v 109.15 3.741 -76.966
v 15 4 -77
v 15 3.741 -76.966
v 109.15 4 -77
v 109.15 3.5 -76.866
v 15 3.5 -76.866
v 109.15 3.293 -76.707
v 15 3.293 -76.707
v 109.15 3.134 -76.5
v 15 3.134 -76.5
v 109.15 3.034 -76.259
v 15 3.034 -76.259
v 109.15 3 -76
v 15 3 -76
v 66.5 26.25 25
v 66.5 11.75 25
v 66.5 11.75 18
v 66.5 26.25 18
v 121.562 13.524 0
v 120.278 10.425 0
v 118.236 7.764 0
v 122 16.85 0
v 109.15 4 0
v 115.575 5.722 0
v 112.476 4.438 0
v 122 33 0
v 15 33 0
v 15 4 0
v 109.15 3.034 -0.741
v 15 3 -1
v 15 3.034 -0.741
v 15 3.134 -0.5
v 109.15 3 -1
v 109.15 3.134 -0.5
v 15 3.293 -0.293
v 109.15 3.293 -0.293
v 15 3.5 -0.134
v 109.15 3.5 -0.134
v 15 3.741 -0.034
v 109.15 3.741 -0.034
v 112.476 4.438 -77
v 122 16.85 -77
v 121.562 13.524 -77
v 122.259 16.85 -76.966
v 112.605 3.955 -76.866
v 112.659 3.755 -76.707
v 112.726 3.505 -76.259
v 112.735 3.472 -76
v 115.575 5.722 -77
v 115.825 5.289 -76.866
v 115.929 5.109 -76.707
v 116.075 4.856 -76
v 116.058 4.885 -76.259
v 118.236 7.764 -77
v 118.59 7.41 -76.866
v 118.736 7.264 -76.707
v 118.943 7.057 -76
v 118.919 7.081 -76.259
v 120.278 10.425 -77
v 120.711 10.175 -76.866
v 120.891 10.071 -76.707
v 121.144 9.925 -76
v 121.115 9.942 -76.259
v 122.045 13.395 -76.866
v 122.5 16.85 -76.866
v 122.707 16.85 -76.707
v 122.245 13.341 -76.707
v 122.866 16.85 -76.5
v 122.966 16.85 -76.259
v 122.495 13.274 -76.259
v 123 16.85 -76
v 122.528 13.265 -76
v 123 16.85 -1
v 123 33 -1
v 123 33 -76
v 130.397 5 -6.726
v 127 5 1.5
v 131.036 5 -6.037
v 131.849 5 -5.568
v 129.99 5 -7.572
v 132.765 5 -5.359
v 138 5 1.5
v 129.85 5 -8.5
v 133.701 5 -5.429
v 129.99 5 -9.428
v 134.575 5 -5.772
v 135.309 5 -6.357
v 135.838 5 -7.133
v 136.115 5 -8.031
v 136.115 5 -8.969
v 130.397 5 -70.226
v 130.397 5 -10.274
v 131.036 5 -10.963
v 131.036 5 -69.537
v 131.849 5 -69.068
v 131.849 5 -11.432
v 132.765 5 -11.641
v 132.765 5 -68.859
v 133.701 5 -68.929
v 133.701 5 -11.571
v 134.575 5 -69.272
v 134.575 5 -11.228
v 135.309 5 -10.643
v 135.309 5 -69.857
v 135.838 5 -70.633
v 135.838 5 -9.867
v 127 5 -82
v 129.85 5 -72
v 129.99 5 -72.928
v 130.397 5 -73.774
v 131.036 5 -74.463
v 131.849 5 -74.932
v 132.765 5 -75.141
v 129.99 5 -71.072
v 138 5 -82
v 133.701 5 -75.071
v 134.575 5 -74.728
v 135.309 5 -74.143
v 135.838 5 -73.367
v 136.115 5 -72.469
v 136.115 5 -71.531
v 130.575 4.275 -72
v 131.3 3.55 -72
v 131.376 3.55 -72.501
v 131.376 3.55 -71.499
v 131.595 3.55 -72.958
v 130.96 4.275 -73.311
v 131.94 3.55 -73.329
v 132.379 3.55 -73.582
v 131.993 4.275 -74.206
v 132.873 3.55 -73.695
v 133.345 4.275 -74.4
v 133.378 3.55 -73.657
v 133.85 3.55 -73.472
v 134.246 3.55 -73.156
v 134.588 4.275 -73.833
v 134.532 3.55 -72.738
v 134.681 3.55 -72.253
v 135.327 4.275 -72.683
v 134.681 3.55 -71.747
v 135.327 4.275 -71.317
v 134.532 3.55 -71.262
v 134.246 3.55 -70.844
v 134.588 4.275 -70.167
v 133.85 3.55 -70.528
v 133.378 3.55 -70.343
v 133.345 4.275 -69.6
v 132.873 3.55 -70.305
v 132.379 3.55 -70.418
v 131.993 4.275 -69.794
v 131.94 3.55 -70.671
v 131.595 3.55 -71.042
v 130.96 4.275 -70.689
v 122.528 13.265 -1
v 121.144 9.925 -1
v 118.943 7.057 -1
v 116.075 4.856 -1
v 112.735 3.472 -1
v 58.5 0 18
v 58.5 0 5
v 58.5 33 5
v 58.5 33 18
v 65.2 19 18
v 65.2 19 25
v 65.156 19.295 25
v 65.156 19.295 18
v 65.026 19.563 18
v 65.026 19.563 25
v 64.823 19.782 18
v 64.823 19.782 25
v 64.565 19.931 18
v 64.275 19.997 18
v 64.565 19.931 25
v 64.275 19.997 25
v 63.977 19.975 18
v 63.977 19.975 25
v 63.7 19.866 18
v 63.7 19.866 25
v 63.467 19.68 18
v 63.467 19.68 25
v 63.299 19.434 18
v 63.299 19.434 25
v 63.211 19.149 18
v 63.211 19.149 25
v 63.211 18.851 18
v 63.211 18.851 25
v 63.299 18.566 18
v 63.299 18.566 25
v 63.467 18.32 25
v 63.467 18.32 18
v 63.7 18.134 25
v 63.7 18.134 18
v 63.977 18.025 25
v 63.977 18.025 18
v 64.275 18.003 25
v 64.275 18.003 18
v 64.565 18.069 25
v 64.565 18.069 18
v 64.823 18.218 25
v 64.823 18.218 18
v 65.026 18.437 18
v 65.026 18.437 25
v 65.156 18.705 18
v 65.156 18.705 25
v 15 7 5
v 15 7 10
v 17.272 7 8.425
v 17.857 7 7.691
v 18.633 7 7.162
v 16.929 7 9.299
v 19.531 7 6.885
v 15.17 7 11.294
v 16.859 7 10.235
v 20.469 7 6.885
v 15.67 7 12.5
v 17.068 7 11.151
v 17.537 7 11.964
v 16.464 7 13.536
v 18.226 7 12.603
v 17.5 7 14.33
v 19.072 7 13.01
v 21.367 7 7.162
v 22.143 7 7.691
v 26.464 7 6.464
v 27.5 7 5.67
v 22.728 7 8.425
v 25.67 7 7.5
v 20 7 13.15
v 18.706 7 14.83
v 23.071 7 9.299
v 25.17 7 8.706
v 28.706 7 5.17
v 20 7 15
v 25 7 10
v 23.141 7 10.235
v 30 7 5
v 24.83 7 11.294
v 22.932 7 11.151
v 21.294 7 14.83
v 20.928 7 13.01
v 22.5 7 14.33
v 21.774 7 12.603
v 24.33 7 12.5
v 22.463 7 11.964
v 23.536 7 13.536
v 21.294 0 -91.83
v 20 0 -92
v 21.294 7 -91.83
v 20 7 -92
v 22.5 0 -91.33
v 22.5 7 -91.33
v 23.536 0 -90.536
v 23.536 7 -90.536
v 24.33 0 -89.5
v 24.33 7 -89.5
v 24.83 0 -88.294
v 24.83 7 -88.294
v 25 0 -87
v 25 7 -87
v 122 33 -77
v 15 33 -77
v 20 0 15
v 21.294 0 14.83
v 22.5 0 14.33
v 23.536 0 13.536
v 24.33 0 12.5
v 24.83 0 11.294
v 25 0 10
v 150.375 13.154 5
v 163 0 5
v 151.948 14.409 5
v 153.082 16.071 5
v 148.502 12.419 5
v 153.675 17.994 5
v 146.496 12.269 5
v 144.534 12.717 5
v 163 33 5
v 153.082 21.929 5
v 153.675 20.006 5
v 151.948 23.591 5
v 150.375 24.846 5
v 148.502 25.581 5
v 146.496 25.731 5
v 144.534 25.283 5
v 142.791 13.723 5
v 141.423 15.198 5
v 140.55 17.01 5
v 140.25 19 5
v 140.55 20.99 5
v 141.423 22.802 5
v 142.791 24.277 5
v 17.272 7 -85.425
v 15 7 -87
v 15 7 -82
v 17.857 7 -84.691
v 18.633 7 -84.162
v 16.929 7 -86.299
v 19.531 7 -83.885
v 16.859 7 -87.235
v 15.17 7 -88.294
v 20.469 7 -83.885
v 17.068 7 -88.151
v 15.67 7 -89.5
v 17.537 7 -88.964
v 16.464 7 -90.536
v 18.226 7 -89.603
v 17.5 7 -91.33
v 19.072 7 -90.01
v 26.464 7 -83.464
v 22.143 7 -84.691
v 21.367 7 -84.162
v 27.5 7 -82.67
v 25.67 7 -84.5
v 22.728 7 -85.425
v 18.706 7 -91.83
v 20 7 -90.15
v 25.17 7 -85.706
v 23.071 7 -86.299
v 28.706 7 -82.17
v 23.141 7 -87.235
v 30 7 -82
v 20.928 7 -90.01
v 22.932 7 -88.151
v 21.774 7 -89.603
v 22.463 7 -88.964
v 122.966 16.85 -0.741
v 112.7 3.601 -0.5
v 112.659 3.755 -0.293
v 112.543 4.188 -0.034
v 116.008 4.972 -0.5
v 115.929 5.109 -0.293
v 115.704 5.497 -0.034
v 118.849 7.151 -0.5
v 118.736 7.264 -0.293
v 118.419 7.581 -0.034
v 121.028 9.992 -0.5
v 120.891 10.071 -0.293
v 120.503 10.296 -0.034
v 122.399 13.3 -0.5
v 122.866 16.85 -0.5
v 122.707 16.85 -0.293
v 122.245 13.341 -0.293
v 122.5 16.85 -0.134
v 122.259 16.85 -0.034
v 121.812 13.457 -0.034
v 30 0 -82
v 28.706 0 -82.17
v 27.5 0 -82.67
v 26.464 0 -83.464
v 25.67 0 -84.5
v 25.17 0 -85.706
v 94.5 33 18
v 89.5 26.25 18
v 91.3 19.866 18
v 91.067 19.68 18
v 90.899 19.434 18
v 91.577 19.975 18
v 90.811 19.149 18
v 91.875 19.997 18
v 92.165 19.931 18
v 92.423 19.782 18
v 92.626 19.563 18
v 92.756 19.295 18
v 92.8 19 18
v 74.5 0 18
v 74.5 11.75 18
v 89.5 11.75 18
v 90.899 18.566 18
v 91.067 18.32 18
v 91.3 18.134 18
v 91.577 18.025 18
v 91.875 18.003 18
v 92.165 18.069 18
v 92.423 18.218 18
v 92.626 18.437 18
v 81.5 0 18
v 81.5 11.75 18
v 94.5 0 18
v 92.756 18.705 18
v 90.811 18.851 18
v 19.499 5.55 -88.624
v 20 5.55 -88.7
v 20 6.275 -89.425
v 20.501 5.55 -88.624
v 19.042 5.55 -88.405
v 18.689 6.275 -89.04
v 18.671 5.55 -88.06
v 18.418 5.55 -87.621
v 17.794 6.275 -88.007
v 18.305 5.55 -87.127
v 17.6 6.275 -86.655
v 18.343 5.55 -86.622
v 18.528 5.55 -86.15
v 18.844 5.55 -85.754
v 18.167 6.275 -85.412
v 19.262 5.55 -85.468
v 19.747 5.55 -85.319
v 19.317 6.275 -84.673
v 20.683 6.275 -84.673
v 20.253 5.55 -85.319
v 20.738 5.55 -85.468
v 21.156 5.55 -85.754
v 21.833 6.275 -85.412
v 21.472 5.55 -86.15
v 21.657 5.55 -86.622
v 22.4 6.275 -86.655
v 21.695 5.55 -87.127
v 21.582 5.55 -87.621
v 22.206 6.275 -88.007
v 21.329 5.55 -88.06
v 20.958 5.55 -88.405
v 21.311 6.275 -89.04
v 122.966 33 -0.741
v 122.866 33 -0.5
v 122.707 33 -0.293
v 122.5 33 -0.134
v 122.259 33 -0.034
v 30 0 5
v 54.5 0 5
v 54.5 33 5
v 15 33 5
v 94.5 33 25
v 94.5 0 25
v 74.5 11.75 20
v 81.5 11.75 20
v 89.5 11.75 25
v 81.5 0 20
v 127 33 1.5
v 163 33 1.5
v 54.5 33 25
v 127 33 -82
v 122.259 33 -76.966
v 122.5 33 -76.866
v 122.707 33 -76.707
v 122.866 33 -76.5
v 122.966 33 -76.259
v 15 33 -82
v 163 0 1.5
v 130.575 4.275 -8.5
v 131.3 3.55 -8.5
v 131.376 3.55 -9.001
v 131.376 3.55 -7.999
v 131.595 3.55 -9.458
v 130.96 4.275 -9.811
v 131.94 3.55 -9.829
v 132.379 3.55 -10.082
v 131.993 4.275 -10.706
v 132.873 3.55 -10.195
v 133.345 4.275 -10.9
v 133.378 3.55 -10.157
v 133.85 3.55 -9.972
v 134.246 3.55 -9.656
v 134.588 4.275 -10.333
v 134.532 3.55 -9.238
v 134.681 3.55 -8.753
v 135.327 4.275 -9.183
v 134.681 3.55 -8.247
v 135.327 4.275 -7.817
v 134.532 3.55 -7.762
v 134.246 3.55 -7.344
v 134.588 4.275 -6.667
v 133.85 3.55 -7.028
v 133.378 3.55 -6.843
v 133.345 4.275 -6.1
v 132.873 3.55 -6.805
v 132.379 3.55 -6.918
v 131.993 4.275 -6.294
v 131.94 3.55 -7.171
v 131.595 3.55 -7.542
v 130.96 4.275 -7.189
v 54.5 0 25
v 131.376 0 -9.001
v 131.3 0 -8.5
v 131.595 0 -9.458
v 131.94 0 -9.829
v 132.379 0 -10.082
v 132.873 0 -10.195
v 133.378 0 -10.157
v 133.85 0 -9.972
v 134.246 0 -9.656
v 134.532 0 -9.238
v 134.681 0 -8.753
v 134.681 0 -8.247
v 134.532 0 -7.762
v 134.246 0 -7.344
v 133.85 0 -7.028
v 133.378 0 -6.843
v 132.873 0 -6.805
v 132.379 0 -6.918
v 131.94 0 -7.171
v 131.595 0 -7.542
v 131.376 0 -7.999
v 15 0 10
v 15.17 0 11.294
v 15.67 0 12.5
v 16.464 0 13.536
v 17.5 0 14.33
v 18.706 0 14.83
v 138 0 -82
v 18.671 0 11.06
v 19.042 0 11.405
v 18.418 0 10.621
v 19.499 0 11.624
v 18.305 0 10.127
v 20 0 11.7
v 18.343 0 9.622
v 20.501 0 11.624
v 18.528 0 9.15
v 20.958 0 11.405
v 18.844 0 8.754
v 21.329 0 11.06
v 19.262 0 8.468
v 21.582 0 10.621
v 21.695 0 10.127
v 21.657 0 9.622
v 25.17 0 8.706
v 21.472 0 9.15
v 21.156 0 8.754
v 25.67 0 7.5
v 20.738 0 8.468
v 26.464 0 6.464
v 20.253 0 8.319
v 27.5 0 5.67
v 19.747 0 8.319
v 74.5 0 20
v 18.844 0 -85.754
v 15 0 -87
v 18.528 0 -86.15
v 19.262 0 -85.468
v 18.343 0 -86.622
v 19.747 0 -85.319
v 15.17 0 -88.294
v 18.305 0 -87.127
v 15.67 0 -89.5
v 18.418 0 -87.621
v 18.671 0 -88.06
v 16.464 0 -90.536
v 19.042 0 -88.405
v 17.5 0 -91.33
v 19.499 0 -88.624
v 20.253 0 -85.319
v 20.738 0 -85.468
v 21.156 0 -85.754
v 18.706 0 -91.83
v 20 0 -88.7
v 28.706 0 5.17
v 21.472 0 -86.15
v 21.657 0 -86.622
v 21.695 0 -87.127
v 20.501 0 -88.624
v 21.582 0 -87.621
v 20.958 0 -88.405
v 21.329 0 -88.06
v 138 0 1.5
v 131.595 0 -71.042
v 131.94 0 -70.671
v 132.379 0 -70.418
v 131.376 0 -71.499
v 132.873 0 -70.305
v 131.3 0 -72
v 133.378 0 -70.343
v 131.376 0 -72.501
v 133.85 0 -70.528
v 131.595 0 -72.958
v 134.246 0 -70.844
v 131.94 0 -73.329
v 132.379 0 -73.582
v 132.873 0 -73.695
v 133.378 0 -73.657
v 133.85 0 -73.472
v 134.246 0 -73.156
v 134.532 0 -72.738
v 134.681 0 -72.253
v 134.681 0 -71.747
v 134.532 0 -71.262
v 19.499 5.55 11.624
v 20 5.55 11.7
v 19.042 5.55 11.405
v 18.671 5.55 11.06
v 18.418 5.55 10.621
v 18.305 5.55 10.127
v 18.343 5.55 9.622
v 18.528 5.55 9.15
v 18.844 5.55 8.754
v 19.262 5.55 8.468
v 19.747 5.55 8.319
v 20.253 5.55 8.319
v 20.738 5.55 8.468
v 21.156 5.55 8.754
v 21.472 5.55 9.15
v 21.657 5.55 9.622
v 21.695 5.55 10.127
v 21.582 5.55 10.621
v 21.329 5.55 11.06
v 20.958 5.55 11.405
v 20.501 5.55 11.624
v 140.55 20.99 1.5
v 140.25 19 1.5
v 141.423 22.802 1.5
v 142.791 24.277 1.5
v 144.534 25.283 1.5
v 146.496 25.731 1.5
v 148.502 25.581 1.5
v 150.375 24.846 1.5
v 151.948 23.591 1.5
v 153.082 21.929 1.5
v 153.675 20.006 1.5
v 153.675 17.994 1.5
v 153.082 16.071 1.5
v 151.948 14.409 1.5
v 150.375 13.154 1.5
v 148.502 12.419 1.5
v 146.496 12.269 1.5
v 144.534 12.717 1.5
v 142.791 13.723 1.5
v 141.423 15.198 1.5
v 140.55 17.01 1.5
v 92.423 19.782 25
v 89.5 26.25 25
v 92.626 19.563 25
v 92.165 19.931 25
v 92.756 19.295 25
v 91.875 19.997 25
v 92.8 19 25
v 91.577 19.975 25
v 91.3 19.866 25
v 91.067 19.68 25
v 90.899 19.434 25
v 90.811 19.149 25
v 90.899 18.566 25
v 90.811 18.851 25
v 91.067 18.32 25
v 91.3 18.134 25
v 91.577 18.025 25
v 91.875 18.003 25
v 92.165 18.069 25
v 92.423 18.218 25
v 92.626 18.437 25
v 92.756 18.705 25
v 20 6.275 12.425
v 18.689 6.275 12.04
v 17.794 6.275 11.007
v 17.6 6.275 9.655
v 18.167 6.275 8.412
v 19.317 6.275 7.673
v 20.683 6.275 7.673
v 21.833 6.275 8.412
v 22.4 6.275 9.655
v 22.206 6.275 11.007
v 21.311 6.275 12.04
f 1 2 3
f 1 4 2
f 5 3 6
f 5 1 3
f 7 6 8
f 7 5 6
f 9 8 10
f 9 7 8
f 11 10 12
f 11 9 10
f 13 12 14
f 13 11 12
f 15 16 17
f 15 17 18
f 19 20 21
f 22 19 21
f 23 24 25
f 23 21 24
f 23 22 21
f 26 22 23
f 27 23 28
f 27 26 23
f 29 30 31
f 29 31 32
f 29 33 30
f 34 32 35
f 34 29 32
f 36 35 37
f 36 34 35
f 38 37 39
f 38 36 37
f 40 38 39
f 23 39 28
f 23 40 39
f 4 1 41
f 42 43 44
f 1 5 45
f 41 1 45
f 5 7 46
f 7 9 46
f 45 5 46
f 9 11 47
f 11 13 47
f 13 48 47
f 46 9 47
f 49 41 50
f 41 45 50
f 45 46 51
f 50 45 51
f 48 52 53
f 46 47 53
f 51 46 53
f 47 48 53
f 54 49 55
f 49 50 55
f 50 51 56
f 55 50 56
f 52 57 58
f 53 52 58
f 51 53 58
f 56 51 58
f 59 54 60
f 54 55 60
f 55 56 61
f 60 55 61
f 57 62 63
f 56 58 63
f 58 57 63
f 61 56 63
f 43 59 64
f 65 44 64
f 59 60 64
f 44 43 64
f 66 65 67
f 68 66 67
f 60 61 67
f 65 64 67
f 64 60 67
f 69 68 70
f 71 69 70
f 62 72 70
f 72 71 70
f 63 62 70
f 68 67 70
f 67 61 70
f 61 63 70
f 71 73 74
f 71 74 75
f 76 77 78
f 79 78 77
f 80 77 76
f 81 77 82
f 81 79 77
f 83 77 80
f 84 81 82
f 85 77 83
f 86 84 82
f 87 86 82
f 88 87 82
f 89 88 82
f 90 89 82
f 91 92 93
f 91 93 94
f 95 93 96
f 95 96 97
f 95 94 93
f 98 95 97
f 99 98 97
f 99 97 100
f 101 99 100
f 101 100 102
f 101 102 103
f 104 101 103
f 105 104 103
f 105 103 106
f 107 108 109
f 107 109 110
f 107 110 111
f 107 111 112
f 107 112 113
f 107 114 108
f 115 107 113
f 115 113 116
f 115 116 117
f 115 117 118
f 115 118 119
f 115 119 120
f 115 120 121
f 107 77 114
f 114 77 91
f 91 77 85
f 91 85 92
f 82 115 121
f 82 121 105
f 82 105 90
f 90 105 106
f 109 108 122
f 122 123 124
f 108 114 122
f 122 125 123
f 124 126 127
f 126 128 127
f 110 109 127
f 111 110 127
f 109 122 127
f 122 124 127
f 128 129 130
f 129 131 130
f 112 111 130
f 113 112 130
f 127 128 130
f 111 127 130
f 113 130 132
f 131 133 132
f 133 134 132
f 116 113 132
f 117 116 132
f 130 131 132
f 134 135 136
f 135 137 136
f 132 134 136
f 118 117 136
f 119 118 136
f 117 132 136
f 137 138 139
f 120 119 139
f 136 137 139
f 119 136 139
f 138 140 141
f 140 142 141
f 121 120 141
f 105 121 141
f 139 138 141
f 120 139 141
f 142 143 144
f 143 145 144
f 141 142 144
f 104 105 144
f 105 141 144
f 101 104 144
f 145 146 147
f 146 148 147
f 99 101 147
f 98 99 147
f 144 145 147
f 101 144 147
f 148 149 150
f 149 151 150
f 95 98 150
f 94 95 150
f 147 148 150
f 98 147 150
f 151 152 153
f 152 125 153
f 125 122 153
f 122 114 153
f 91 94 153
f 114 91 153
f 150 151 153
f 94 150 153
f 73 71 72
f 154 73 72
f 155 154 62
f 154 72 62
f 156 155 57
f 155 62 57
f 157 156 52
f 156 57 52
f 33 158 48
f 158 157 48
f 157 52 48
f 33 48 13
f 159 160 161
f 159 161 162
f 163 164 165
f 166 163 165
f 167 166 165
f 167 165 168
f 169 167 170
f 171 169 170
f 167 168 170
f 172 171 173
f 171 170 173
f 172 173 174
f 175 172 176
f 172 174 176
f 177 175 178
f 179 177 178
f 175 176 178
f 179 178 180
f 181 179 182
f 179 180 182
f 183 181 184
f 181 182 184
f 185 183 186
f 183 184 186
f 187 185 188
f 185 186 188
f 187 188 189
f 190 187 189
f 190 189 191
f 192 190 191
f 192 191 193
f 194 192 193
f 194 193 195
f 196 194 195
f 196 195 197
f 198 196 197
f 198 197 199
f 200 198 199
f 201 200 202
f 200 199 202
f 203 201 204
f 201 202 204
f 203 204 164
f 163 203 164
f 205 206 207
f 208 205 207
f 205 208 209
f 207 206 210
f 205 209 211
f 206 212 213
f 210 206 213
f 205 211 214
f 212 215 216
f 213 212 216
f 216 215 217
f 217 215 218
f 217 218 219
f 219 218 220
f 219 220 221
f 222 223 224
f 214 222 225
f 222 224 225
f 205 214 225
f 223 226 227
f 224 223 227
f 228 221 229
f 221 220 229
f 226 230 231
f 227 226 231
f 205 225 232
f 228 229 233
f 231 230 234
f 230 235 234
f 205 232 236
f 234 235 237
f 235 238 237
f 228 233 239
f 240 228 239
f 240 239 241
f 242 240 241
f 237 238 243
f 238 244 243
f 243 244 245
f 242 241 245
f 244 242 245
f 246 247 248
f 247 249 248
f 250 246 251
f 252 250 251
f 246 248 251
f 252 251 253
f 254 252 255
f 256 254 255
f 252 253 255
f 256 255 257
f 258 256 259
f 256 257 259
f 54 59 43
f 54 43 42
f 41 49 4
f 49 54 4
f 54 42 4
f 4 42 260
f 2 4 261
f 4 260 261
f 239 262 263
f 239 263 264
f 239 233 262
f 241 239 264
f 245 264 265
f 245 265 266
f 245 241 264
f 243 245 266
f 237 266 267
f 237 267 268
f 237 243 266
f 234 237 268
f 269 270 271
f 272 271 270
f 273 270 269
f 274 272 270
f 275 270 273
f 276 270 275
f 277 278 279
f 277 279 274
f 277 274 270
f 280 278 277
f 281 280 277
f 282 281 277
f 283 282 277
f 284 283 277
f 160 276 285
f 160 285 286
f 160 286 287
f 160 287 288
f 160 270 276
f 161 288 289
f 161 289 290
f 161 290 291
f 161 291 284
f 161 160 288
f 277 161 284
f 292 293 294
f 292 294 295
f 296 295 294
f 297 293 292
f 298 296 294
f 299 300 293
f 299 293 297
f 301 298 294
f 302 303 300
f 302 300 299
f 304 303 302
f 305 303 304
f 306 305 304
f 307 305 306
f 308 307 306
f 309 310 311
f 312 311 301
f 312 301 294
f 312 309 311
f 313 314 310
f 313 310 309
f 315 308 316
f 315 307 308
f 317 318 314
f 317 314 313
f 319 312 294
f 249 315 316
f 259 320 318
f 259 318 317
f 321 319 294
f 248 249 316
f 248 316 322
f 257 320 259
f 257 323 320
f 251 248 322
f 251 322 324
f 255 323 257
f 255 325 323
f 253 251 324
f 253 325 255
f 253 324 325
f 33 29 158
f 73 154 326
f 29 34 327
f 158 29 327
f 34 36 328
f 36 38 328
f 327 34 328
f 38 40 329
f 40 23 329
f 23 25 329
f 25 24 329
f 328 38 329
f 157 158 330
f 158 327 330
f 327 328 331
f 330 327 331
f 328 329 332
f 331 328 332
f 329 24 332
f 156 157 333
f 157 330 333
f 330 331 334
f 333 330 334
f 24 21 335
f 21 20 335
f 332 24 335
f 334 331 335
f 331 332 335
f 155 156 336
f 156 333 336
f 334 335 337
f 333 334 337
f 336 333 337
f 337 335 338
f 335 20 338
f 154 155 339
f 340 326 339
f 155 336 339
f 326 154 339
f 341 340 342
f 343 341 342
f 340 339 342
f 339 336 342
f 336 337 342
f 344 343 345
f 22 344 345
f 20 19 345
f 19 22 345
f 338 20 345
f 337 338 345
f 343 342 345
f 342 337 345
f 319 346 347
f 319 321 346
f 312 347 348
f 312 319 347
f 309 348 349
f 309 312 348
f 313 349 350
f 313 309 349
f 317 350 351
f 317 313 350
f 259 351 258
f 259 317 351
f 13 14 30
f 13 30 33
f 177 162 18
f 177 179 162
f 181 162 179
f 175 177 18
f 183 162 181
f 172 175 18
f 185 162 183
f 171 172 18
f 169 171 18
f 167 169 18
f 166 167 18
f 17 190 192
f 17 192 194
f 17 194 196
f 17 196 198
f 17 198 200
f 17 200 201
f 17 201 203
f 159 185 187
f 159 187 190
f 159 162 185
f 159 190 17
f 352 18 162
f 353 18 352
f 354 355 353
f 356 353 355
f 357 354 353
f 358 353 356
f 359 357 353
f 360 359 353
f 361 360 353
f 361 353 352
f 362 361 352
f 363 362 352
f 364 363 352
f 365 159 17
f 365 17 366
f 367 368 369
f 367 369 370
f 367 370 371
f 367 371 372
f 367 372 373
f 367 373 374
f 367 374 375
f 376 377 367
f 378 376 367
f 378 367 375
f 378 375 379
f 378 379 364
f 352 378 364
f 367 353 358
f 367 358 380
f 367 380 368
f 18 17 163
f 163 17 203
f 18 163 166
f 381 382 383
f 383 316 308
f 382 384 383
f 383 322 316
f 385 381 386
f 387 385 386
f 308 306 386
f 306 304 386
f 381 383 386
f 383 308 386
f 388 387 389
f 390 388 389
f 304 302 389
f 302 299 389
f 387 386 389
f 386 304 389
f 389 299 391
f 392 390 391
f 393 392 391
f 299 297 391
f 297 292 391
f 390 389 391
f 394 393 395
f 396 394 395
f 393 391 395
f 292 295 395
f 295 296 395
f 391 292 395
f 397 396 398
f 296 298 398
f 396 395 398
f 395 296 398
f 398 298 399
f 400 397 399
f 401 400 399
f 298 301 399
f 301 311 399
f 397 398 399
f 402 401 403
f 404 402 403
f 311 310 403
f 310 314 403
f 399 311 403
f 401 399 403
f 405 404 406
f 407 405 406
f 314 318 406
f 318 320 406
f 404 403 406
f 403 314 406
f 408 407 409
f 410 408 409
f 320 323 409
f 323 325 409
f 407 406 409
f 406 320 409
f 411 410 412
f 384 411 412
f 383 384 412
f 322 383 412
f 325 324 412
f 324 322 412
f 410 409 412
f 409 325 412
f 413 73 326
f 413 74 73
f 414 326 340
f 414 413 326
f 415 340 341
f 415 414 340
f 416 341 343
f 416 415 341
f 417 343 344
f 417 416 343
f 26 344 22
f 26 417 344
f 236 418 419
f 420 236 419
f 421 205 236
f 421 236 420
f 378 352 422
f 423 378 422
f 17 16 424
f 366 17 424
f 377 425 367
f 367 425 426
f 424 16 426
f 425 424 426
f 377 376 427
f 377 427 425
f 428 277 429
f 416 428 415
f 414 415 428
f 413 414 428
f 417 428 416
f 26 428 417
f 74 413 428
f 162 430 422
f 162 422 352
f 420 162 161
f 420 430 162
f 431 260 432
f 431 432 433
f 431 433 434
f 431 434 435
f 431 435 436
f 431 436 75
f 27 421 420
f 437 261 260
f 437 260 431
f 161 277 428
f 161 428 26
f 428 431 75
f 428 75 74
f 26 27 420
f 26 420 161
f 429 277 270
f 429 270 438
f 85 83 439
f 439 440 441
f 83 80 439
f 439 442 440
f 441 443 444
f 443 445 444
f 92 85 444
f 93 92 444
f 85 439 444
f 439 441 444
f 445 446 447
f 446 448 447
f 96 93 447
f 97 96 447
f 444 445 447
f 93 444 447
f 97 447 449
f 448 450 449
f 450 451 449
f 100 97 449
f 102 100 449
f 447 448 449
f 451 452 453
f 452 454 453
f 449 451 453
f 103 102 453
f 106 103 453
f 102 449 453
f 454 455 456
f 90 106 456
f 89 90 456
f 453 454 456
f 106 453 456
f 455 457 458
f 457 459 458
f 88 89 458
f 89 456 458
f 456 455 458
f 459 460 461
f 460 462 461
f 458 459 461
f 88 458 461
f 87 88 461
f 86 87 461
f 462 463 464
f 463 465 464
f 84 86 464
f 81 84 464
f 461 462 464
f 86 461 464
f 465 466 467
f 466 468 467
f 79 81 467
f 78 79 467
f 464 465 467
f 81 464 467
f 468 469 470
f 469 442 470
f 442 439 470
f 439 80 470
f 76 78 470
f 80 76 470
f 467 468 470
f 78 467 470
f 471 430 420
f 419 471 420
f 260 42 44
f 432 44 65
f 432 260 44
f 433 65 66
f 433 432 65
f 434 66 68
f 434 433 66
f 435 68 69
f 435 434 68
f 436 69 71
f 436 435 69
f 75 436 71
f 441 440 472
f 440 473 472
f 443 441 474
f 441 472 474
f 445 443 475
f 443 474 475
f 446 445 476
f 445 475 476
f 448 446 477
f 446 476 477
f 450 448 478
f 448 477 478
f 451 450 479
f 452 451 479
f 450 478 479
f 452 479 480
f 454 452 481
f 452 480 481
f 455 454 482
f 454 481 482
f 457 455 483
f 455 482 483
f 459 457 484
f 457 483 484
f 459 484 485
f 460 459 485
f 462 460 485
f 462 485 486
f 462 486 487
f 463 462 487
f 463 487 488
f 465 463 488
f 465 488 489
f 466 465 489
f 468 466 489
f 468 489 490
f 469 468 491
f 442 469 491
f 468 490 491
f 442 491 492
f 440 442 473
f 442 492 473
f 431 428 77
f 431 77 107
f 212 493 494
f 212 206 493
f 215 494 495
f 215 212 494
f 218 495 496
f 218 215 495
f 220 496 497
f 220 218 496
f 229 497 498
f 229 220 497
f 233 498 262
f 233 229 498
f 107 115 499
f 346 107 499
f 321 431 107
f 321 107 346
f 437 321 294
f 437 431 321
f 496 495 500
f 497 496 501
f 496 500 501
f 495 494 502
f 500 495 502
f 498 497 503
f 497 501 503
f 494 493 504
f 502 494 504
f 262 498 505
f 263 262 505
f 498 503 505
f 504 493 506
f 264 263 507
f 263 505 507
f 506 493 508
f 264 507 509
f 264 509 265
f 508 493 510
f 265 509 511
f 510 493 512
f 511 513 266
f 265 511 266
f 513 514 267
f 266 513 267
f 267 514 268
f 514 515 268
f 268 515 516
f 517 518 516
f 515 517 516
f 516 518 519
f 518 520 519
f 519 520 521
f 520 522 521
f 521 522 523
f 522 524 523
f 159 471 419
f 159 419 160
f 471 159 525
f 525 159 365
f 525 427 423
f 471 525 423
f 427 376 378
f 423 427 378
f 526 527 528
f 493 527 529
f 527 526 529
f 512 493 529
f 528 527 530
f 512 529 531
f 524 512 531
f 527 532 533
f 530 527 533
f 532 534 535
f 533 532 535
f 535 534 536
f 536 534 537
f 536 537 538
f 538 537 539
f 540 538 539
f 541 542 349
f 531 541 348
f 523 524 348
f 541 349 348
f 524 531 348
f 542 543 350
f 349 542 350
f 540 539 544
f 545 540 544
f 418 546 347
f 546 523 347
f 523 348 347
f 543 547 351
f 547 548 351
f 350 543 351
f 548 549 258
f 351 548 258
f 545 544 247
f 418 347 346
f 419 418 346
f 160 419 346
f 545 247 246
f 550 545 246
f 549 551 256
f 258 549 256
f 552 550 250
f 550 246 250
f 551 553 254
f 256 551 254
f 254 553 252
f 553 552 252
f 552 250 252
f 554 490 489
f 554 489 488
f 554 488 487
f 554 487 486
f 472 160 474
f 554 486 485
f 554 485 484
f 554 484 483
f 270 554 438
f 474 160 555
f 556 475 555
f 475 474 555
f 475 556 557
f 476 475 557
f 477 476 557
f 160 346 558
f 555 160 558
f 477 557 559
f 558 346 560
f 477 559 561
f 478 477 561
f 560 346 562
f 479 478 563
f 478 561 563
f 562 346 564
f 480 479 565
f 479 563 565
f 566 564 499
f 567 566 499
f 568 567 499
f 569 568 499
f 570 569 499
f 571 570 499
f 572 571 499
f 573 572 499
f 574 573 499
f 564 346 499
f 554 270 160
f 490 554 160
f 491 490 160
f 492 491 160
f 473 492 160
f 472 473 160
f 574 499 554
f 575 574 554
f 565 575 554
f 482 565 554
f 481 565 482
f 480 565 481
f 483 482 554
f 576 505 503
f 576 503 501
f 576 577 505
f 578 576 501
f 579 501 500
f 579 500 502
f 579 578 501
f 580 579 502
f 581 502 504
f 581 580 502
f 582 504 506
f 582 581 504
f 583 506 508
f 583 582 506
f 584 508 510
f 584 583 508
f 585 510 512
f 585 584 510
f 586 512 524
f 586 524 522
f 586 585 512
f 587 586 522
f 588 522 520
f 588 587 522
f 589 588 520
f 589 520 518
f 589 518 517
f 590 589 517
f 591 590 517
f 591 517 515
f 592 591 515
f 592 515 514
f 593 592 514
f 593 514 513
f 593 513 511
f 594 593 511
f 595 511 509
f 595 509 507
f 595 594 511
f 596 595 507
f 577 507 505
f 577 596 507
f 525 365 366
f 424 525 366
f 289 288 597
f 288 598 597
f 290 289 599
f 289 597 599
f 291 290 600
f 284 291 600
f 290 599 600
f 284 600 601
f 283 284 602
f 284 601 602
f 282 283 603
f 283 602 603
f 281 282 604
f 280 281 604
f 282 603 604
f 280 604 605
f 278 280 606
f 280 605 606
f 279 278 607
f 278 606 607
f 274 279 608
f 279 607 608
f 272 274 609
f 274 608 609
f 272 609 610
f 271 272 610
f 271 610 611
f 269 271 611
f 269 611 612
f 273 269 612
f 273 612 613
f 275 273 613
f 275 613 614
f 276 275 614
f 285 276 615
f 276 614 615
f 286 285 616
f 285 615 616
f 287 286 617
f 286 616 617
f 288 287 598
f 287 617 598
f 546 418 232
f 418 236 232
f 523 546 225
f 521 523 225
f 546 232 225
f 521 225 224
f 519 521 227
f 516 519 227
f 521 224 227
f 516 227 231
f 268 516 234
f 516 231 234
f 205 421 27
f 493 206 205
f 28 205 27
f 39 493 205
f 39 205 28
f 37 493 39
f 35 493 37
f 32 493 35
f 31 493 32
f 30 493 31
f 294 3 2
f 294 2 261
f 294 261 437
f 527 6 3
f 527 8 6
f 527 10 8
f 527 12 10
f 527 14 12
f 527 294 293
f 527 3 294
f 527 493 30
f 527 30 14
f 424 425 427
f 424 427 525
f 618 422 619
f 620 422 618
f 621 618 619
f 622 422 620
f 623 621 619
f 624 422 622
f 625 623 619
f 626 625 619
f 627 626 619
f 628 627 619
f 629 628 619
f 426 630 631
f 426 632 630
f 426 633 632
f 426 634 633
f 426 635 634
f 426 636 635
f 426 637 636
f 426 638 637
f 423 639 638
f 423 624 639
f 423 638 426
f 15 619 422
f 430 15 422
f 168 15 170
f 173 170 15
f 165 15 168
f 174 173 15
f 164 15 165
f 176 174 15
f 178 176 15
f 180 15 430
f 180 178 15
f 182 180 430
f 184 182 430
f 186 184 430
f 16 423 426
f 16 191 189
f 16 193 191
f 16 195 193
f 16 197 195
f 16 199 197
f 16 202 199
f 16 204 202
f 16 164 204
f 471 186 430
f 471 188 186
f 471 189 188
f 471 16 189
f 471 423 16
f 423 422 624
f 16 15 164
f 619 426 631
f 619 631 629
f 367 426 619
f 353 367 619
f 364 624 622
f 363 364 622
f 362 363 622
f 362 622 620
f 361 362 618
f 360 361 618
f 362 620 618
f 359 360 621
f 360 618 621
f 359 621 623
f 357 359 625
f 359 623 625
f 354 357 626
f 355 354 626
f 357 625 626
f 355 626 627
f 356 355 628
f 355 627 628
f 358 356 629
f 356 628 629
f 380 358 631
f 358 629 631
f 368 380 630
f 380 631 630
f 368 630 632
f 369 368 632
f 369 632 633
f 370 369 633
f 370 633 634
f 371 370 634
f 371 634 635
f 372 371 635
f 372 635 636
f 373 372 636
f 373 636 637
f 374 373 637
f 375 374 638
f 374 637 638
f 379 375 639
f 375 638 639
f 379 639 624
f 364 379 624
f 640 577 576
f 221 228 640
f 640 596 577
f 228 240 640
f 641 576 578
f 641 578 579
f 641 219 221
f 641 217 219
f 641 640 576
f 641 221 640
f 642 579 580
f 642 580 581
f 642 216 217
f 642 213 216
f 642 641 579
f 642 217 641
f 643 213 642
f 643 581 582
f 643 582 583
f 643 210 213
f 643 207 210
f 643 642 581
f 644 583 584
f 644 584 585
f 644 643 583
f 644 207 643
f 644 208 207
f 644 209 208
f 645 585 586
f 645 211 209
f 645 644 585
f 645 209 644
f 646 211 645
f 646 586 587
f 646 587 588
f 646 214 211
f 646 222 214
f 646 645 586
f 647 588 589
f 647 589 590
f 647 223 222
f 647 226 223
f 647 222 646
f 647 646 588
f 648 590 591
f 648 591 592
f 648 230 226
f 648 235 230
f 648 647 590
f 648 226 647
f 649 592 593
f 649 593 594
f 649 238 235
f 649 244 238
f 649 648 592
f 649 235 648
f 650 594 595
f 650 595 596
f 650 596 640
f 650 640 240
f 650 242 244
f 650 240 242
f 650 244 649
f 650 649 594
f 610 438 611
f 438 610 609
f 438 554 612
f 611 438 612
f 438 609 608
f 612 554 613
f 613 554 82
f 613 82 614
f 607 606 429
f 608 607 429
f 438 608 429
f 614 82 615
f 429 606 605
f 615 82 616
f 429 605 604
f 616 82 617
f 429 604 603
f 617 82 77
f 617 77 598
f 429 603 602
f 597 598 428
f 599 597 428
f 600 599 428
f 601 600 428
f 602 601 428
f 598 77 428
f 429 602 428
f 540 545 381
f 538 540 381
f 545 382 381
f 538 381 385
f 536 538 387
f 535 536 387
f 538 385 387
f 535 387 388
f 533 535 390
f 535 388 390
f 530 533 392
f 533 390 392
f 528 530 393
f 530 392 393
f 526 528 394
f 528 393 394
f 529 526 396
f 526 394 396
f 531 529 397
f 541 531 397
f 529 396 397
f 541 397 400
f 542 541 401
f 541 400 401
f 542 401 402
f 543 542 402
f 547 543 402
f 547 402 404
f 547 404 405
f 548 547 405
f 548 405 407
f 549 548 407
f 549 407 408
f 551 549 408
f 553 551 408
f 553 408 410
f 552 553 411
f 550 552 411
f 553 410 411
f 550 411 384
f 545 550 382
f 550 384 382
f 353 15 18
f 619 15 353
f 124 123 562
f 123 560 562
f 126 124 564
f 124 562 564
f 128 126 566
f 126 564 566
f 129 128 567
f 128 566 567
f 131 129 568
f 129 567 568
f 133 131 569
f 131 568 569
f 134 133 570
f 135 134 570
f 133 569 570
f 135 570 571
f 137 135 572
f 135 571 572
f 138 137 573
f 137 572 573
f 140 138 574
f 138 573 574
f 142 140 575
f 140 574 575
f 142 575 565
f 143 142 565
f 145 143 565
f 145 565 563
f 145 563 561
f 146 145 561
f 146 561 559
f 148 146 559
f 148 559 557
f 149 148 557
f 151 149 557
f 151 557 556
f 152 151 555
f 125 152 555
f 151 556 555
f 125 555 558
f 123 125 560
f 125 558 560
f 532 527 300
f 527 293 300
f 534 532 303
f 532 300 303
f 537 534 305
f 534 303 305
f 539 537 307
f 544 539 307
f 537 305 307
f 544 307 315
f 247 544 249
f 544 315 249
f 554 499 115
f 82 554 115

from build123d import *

# Parameters (mm, degrees)
ESQUISSE1_W                                    = 138
ESQUISSE1_H                                    = 77
BOSS_EXTRU_1_DEPTH                             = 3
ESQUISSE2_W                                    = 15
ESQUISSE2_H                                    = 77
BOSS_EXTRU_2_DEPTH                             = 30
CONG_1_R                                       = 13.85
ESQUISSE3_W                                    = 138
ESQUISSE3_H                                    = 33
BOSS_EXTRU_3_DEPTH                             = 5
ENL_V_MAT_EXTRU_13_REACH                       = 168.439
ESQUISSE26_W                                   = 15
ESQUISSE26_H                                   = 33
CONG_5_R                                       = 1
ESQUISSE33_W                                   = 11
ESQUISSE33_H                                   = 83.5
ENL_V_MAT_EXTRU_15_DEPTH                       = 28
ESQUISSE34_W                                   = 3.5
ESQUISSE34_H                                   = 33
BOSS_EXTRU_8_DEPTH                             = 25
BOSS_EXTRU_11_DEPTH                            = 33
ESQUISSE35_R                                   = 1
ESQUISSE35_W                                   = 23
ESQUISSE35_H                                   = 14.5
ENL_V_MAT_EXTRU_16_DEPTH                       = 7
ESQUISSE36_W                                   = 7
ESQUISSE36_H                                   = 11.75
ENL_V_MAT_EXTRU_17_DEPTH                       = 2
ESQUISSE44_R                                   = 6
ENL_V_MAT_EXTRU_19_DEPTH                       = 3.5
D_GAGEMENT_M124_D                              = 13.5
D_GAGEMENT_M124_DEPTH                          = 3.5
D_GAGEMENT_M124_TIP                            = 4.055809178
ESQUISSE48_R                                   = 1.5
ENL_V_MAT_EXTRU_20_DEPTH                       = 5
FRAISAGE_POUR_VIS_T_TE_FRAIS_E_M32_D           = 3.4
FRAISAGE_POUR_VIS_T_TE_FRAIS_E_M32_DEPTH       = 5
FRAISAGE_POUR_VIS_T_TE_FRAIS_E_M32_CSINK_D     = 6.3
FRAISAGE_POUR_VIS_T_TE_FRAIS_E_M32_CSINK_ANGLE = 90
FRAISAGE_POUR_VIS_T_TE_FRAIS_E_M32_TIP         = 1.021463052
ESQUISSE52_W                                   = 10
ESQUISSE52_H                                   = 10
BOSS_EXTRU_12_DEPTH                            = 7
ESQUISSE53_R                                   = 1.5
ENL_V_MAT_EXTRU_21_DEPTH                       = 7
CONG_8_R                                       = 5


with BuildPart() as part:
    # Esquisse1 → Boss.-Extru.1 (new body)
    with BuildSketch(Plane(origin=(0, 0, 0), x_dir=(1, 0, 0), z_dir=(0, 1, 0))):
        with Locations((69, 38.5)):
            Rectangle(ESQUISSE1_W, ESQUISSE1_H)
    extrude(amount=BOSS_EXTRU_1_DEPTH)

    # Esquisse2 → Boss.-Extru.2 (add)
    with BuildSketch(Plane(origin=(0, 3, 0), x_dir=(1, 0, 0), z_dir=(0, 1, 0))):
        with Locations((130.5, 38.5)):
            Rectangle(ESQUISSE2_W, ESQUISSE2_H)
    extrude(amount=BOSS_EXTRU_2_DEPTH)

    # Congé1
    cong_1_edges = [part.edges().sort_by_distance(p)[0] for p in [
        (123, 3, -38.5),
    ]]
    fillet(cong_1_edges, radius=CONG_1_R)

    # Esquisse3 → Boss.-Extru.3 (add)
    with BuildSketch(Plane(origin=(0, 0, -77), x_dir=(-1, 0, 0), z_dir=(0, 0, -1))):
        with Locations((-69, 16.5)):
            Rectangle(ESQUISSE3_W, ESQUISSE3_H)
    boss_extru_3 = extrude(amount=BOSS_EXTRU_3_DEPTH)

    # Symétrie1: Boss.-Extru.3 across plane
    add(boss_extru_3.mirror(Plane.XY.offset(-38.5)))

    # Enlèv. mat.-Extru.13: up to this face of the body (flat: up to its plane)
    enl_v_mat_extru_13_end = Plane(part.part.faces().sort_by_distance((69, 16.5, -82))[0])
    # Esquisse26 → Enlèv. mat.-Extru.13 (cut, up to the picked face)
    with BuildSketch(Plane.XY.offset(5), mode=Mode.PRIVATE) as enl_v_mat_extru_13_sk1:
        with Locations((7.5, 16.5)):
            Rectangle(ESQUISSE26_W, ESQUISSE26_H)
    enl_v_mat_extru_13_tool1 = split(extrude(enl_v_mat_extru_13_sk1.sketch, amount=-ENL_V_MAT_EXTRU_13_REACH, mode=Mode.PRIVATE), bisect_by=enl_v_mat_extru_13_end, keep=Keep.BOTH, mode=Mode.PRIVATE)
    add(enl_v_mat_extru_13_tool1.solids().sort_by(Axis((7.5, 16.5, 5), (0, 0, -1)))[0], mode=Mode.SUBTRACT)

    # Congé5
    cong_5_edges = [part.edges().sort_by_distance(p)[0] for p in [
        (123, 24.925, -77),
        (123, 24.925, 0),
        (62.075, 3, -77),
        (118.943428919, 7.056571081, 0),
        (118.943428919, 7.056571081, -77),
        (62.075, 3, 0),
    ]]
    fillet(cong_5_edges, radius=CONG_5_R)

    # Esquisse33 → Enlèv. mat.-Extru.15 (cut)
    with BuildSketch(Plane(origin=(0, 33, 0), x_dir=(1, 0, 0), z_dir=(0, 1, 0))):
        with Locations((132.5, 40.25)):
            Rectangle(ESQUISSE33_W, ESQUISSE33_H)
    extrude(amount=-ENL_V_MAT_EXTRU_15_DEPTH, mode=Mode.SUBTRACT)

    # Esquisse34 → Boss.-Extru.8 (add)
    with BuildSketch(Plane(origin=(138, 0, 0), x_dir=(0, 0, -1), z_dir=(1, 0, 0))):
        with Locations((-3.25, 16.5)):
            Rectangle(ESQUISSE34_W, ESQUISSE34_H)
    extrude(amount=BOSS_EXTRU_8_DEPTH)

    # Esquisse43 → Boss.-Extru.11 (add)
    with BuildSketch(Plane.XZ):
        Polygon((54.5, 5), (58.5, 5), (58.5, 18), (94.5, 18), (94.5, 25), (54.5, 25), align=None)
    extrude(amount=-BOSS_EXTRU_11_DEPTH)

    # Esquisse35 → Enlèv. mat.-Extru.16 (cut)
    with BuildSketch(Plane.XY.offset(25)):
        with Locations((91.8, 19)):
            Circle(ESQUISSE35_R)
        with Locations((64.2, 19)):
            Circle(ESQUISSE35_R)
        with Locations((78, 19)):
            Rectangle(ESQUISSE35_W, ESQUISSE35_H)
    extrude(amount=-ENL_V_MAT_EXTRU_16_DEPTH, mode=Mode.SUBTRACT)

    # Esquisse36 → Enlèv. mat.-Extru.17 (cut)
    with BuildSketch(Plane(origin=(0, 0, 18), x_dir=(-1, 0, 0), z_dir=(0, 0, -1))):
        with Locations((-78, 5.875)):
            Rectangle(ESQUISSE36_W, ESQUISSE36_H)
    extrude(amount=-ENL_V_MAT_EXTRU_17_DEPTH, mode=Mode.SUBTRACT)

    # Esquisse44 → Enlèv. mat.-Extru.19 (cut)
    with BuildSketch(Plane.XY.offset(5)):
        with Locations((147, 19)):
            Circle(ESQUISSE44_R)
    extrude(amount=-ENL_V_MAT_EXTRU_19_DEPTH, mode=Mode.SUBTRACT)

    # Dégagement M124
    with Locations(Plane.XY.offset(5)):
        with Locations((147, 19)):
            Hole(D_GAGEMENT_M124_D / 2, depth=D_GAGEMENT_M124_DEPTH)
            with Locations((0, 0, -(D_GAGEMENT_M124_DEPTH + D_GAGEMENT_M124_TIP / 2))):  # 118° drill point
                Cone(0, D_GAGEMENT_M124_D / 2, D_GAGEMENT_M124_TIP, mode=Mode.SUBTRACT)

    # Esquisse48 → Enlèv. mat.-Extru.20 (cut)
    with BuildSketch(Plane(origin=(0, 5, 0), x_dir=(1, 0, 0), z_dir=(0, 1, 0))):
        with Locations(Location((133, 8.5, 0), (0, 0, 270))):
            Circle(ESQUISSE48_R)
        with Locations(Location((133, 72, 0), (0, 0, 270))):
            Circle(ESQUISSE48_R)
    extrude(amount=-ENL_V_MAT_EXTRU_20_DEPTH, mode=Mode.SUBTRACT)

    # Fraisage pour vis à tête fraisée M32
    with Locations(Plane(origin=(0, 5, 0), x_dir=(1, 0, 0), z_dir=(0, 1, 0))):
        with Locations((133, 72), (133, 8.5)):
            CounterSinkHole(FRAISAGE_POUR_VIS_T_TE_FRAIS_E_M32_D / 2, FRAISAGE_POUR_VIS_T_TE_FRAIS_E_M32_CSINK_D / 2, depth=FRAISAGE_POUR_VIS_T_TE_FRAIS_E_M32_DEPTH, counter_sink_angle=FRAISAGE_POUR_VIS_T_TE_FRAIS_E_M32_CSINK_ANGLE)
            with Locations((0, 0, -(FRAISAGE_POUR_VIS_T_TE_FRAIS_E_M32_DEPTH + FRAISAGE_POUR_VIS_T_TE_FRAIS_E_M32_TIP / 2))):  # 118° drill point
                Cone(0, FRAISAGE_POUR_VIS_T_TE_FRAIS_E_M32_D / 2, FRAISAGE_POUR_VIS_T_TE_FRAIS_E_M32_TIP, mode=Mode.SUBTRACT)

    # Esquisse52 → Boss.-Extru.12 (add)
    with BuildSketch(Plane.XZ):
        with Locations((20, 10)):
            Rectangle(ESQUISSE52_W, ESQUISSE52_H)
    boss_extru_12 = extrude(amount=-BOSS_EXTRU_12_DEPTH)

    # Esquisse53 → Enlèv. mat.-Extru.21 (cut)
    with BuildSketch(Plane(origin=(0, 7, 0), x_dir=(1, 0, 0), z_dir=(0, 1, 0))):
        with Locations(Location((20, -10, 0), (0, 0, 270))):
            Circle(ESQUISSE53_R)
    enl_v_mat_extru_21 = extrude(amount=-ENL_V_MAT_EXTRU_21_DEPTH, mode=Mode.SUBTRACT)

    # Esquisse55 → Fraisage pour vis à tête fraisée M33 (revolve, cut)
    with BuildSketch(Plane(origin=(20, 7, 10), x_dir=(0, 0, 1), z_dir=(1, 0, 0))):
        Polygon((0, 0), (0, 8.021463052), (1.7, 7), (1.7, 1.45), (3.15, 0), align=None)
    fraisage_pour_vis_t_te_frais_e_m33 = revolve(axis=Axis((20, 13.35, 10), (0, -1, 0)), mode=Mode.SUBTRACT)

    # Symétrie2: Boss.-Extru.12, Enlèv. mat.-Extru.21, Fraisage pour vis à tête fraisée M33 across plane
    add(boss_extru_12.mirror(Plane.XY.offset(-38.5)))
    add(enl_v_mat_extru_21.mirror(Plane.XY.offset(-38.5)), mode=Mode.SUBTRACT)
    add(fraisage_pour_vis_t_te_frais_e_m33.mirror(Plane.XY.offset(-38.5)), mode=Mode.SUBTRACT)

    # Congé8
    cong_8_edges = [part.edges().sort_by_distance(p)[0] for p in [
        (25, 3.5, 5),
        (25, 3.5, 15),
        (15, 3.5, 15),
        (15, 3.5, -92),
        (25, 3.5, -92),
        (25, 3.5, -82),
    ]]
    fillet(cong_8_edges, radius=CONG_8_R - 0.0001)  # a hair under: the kernel refuses the full size


solid = part.part
